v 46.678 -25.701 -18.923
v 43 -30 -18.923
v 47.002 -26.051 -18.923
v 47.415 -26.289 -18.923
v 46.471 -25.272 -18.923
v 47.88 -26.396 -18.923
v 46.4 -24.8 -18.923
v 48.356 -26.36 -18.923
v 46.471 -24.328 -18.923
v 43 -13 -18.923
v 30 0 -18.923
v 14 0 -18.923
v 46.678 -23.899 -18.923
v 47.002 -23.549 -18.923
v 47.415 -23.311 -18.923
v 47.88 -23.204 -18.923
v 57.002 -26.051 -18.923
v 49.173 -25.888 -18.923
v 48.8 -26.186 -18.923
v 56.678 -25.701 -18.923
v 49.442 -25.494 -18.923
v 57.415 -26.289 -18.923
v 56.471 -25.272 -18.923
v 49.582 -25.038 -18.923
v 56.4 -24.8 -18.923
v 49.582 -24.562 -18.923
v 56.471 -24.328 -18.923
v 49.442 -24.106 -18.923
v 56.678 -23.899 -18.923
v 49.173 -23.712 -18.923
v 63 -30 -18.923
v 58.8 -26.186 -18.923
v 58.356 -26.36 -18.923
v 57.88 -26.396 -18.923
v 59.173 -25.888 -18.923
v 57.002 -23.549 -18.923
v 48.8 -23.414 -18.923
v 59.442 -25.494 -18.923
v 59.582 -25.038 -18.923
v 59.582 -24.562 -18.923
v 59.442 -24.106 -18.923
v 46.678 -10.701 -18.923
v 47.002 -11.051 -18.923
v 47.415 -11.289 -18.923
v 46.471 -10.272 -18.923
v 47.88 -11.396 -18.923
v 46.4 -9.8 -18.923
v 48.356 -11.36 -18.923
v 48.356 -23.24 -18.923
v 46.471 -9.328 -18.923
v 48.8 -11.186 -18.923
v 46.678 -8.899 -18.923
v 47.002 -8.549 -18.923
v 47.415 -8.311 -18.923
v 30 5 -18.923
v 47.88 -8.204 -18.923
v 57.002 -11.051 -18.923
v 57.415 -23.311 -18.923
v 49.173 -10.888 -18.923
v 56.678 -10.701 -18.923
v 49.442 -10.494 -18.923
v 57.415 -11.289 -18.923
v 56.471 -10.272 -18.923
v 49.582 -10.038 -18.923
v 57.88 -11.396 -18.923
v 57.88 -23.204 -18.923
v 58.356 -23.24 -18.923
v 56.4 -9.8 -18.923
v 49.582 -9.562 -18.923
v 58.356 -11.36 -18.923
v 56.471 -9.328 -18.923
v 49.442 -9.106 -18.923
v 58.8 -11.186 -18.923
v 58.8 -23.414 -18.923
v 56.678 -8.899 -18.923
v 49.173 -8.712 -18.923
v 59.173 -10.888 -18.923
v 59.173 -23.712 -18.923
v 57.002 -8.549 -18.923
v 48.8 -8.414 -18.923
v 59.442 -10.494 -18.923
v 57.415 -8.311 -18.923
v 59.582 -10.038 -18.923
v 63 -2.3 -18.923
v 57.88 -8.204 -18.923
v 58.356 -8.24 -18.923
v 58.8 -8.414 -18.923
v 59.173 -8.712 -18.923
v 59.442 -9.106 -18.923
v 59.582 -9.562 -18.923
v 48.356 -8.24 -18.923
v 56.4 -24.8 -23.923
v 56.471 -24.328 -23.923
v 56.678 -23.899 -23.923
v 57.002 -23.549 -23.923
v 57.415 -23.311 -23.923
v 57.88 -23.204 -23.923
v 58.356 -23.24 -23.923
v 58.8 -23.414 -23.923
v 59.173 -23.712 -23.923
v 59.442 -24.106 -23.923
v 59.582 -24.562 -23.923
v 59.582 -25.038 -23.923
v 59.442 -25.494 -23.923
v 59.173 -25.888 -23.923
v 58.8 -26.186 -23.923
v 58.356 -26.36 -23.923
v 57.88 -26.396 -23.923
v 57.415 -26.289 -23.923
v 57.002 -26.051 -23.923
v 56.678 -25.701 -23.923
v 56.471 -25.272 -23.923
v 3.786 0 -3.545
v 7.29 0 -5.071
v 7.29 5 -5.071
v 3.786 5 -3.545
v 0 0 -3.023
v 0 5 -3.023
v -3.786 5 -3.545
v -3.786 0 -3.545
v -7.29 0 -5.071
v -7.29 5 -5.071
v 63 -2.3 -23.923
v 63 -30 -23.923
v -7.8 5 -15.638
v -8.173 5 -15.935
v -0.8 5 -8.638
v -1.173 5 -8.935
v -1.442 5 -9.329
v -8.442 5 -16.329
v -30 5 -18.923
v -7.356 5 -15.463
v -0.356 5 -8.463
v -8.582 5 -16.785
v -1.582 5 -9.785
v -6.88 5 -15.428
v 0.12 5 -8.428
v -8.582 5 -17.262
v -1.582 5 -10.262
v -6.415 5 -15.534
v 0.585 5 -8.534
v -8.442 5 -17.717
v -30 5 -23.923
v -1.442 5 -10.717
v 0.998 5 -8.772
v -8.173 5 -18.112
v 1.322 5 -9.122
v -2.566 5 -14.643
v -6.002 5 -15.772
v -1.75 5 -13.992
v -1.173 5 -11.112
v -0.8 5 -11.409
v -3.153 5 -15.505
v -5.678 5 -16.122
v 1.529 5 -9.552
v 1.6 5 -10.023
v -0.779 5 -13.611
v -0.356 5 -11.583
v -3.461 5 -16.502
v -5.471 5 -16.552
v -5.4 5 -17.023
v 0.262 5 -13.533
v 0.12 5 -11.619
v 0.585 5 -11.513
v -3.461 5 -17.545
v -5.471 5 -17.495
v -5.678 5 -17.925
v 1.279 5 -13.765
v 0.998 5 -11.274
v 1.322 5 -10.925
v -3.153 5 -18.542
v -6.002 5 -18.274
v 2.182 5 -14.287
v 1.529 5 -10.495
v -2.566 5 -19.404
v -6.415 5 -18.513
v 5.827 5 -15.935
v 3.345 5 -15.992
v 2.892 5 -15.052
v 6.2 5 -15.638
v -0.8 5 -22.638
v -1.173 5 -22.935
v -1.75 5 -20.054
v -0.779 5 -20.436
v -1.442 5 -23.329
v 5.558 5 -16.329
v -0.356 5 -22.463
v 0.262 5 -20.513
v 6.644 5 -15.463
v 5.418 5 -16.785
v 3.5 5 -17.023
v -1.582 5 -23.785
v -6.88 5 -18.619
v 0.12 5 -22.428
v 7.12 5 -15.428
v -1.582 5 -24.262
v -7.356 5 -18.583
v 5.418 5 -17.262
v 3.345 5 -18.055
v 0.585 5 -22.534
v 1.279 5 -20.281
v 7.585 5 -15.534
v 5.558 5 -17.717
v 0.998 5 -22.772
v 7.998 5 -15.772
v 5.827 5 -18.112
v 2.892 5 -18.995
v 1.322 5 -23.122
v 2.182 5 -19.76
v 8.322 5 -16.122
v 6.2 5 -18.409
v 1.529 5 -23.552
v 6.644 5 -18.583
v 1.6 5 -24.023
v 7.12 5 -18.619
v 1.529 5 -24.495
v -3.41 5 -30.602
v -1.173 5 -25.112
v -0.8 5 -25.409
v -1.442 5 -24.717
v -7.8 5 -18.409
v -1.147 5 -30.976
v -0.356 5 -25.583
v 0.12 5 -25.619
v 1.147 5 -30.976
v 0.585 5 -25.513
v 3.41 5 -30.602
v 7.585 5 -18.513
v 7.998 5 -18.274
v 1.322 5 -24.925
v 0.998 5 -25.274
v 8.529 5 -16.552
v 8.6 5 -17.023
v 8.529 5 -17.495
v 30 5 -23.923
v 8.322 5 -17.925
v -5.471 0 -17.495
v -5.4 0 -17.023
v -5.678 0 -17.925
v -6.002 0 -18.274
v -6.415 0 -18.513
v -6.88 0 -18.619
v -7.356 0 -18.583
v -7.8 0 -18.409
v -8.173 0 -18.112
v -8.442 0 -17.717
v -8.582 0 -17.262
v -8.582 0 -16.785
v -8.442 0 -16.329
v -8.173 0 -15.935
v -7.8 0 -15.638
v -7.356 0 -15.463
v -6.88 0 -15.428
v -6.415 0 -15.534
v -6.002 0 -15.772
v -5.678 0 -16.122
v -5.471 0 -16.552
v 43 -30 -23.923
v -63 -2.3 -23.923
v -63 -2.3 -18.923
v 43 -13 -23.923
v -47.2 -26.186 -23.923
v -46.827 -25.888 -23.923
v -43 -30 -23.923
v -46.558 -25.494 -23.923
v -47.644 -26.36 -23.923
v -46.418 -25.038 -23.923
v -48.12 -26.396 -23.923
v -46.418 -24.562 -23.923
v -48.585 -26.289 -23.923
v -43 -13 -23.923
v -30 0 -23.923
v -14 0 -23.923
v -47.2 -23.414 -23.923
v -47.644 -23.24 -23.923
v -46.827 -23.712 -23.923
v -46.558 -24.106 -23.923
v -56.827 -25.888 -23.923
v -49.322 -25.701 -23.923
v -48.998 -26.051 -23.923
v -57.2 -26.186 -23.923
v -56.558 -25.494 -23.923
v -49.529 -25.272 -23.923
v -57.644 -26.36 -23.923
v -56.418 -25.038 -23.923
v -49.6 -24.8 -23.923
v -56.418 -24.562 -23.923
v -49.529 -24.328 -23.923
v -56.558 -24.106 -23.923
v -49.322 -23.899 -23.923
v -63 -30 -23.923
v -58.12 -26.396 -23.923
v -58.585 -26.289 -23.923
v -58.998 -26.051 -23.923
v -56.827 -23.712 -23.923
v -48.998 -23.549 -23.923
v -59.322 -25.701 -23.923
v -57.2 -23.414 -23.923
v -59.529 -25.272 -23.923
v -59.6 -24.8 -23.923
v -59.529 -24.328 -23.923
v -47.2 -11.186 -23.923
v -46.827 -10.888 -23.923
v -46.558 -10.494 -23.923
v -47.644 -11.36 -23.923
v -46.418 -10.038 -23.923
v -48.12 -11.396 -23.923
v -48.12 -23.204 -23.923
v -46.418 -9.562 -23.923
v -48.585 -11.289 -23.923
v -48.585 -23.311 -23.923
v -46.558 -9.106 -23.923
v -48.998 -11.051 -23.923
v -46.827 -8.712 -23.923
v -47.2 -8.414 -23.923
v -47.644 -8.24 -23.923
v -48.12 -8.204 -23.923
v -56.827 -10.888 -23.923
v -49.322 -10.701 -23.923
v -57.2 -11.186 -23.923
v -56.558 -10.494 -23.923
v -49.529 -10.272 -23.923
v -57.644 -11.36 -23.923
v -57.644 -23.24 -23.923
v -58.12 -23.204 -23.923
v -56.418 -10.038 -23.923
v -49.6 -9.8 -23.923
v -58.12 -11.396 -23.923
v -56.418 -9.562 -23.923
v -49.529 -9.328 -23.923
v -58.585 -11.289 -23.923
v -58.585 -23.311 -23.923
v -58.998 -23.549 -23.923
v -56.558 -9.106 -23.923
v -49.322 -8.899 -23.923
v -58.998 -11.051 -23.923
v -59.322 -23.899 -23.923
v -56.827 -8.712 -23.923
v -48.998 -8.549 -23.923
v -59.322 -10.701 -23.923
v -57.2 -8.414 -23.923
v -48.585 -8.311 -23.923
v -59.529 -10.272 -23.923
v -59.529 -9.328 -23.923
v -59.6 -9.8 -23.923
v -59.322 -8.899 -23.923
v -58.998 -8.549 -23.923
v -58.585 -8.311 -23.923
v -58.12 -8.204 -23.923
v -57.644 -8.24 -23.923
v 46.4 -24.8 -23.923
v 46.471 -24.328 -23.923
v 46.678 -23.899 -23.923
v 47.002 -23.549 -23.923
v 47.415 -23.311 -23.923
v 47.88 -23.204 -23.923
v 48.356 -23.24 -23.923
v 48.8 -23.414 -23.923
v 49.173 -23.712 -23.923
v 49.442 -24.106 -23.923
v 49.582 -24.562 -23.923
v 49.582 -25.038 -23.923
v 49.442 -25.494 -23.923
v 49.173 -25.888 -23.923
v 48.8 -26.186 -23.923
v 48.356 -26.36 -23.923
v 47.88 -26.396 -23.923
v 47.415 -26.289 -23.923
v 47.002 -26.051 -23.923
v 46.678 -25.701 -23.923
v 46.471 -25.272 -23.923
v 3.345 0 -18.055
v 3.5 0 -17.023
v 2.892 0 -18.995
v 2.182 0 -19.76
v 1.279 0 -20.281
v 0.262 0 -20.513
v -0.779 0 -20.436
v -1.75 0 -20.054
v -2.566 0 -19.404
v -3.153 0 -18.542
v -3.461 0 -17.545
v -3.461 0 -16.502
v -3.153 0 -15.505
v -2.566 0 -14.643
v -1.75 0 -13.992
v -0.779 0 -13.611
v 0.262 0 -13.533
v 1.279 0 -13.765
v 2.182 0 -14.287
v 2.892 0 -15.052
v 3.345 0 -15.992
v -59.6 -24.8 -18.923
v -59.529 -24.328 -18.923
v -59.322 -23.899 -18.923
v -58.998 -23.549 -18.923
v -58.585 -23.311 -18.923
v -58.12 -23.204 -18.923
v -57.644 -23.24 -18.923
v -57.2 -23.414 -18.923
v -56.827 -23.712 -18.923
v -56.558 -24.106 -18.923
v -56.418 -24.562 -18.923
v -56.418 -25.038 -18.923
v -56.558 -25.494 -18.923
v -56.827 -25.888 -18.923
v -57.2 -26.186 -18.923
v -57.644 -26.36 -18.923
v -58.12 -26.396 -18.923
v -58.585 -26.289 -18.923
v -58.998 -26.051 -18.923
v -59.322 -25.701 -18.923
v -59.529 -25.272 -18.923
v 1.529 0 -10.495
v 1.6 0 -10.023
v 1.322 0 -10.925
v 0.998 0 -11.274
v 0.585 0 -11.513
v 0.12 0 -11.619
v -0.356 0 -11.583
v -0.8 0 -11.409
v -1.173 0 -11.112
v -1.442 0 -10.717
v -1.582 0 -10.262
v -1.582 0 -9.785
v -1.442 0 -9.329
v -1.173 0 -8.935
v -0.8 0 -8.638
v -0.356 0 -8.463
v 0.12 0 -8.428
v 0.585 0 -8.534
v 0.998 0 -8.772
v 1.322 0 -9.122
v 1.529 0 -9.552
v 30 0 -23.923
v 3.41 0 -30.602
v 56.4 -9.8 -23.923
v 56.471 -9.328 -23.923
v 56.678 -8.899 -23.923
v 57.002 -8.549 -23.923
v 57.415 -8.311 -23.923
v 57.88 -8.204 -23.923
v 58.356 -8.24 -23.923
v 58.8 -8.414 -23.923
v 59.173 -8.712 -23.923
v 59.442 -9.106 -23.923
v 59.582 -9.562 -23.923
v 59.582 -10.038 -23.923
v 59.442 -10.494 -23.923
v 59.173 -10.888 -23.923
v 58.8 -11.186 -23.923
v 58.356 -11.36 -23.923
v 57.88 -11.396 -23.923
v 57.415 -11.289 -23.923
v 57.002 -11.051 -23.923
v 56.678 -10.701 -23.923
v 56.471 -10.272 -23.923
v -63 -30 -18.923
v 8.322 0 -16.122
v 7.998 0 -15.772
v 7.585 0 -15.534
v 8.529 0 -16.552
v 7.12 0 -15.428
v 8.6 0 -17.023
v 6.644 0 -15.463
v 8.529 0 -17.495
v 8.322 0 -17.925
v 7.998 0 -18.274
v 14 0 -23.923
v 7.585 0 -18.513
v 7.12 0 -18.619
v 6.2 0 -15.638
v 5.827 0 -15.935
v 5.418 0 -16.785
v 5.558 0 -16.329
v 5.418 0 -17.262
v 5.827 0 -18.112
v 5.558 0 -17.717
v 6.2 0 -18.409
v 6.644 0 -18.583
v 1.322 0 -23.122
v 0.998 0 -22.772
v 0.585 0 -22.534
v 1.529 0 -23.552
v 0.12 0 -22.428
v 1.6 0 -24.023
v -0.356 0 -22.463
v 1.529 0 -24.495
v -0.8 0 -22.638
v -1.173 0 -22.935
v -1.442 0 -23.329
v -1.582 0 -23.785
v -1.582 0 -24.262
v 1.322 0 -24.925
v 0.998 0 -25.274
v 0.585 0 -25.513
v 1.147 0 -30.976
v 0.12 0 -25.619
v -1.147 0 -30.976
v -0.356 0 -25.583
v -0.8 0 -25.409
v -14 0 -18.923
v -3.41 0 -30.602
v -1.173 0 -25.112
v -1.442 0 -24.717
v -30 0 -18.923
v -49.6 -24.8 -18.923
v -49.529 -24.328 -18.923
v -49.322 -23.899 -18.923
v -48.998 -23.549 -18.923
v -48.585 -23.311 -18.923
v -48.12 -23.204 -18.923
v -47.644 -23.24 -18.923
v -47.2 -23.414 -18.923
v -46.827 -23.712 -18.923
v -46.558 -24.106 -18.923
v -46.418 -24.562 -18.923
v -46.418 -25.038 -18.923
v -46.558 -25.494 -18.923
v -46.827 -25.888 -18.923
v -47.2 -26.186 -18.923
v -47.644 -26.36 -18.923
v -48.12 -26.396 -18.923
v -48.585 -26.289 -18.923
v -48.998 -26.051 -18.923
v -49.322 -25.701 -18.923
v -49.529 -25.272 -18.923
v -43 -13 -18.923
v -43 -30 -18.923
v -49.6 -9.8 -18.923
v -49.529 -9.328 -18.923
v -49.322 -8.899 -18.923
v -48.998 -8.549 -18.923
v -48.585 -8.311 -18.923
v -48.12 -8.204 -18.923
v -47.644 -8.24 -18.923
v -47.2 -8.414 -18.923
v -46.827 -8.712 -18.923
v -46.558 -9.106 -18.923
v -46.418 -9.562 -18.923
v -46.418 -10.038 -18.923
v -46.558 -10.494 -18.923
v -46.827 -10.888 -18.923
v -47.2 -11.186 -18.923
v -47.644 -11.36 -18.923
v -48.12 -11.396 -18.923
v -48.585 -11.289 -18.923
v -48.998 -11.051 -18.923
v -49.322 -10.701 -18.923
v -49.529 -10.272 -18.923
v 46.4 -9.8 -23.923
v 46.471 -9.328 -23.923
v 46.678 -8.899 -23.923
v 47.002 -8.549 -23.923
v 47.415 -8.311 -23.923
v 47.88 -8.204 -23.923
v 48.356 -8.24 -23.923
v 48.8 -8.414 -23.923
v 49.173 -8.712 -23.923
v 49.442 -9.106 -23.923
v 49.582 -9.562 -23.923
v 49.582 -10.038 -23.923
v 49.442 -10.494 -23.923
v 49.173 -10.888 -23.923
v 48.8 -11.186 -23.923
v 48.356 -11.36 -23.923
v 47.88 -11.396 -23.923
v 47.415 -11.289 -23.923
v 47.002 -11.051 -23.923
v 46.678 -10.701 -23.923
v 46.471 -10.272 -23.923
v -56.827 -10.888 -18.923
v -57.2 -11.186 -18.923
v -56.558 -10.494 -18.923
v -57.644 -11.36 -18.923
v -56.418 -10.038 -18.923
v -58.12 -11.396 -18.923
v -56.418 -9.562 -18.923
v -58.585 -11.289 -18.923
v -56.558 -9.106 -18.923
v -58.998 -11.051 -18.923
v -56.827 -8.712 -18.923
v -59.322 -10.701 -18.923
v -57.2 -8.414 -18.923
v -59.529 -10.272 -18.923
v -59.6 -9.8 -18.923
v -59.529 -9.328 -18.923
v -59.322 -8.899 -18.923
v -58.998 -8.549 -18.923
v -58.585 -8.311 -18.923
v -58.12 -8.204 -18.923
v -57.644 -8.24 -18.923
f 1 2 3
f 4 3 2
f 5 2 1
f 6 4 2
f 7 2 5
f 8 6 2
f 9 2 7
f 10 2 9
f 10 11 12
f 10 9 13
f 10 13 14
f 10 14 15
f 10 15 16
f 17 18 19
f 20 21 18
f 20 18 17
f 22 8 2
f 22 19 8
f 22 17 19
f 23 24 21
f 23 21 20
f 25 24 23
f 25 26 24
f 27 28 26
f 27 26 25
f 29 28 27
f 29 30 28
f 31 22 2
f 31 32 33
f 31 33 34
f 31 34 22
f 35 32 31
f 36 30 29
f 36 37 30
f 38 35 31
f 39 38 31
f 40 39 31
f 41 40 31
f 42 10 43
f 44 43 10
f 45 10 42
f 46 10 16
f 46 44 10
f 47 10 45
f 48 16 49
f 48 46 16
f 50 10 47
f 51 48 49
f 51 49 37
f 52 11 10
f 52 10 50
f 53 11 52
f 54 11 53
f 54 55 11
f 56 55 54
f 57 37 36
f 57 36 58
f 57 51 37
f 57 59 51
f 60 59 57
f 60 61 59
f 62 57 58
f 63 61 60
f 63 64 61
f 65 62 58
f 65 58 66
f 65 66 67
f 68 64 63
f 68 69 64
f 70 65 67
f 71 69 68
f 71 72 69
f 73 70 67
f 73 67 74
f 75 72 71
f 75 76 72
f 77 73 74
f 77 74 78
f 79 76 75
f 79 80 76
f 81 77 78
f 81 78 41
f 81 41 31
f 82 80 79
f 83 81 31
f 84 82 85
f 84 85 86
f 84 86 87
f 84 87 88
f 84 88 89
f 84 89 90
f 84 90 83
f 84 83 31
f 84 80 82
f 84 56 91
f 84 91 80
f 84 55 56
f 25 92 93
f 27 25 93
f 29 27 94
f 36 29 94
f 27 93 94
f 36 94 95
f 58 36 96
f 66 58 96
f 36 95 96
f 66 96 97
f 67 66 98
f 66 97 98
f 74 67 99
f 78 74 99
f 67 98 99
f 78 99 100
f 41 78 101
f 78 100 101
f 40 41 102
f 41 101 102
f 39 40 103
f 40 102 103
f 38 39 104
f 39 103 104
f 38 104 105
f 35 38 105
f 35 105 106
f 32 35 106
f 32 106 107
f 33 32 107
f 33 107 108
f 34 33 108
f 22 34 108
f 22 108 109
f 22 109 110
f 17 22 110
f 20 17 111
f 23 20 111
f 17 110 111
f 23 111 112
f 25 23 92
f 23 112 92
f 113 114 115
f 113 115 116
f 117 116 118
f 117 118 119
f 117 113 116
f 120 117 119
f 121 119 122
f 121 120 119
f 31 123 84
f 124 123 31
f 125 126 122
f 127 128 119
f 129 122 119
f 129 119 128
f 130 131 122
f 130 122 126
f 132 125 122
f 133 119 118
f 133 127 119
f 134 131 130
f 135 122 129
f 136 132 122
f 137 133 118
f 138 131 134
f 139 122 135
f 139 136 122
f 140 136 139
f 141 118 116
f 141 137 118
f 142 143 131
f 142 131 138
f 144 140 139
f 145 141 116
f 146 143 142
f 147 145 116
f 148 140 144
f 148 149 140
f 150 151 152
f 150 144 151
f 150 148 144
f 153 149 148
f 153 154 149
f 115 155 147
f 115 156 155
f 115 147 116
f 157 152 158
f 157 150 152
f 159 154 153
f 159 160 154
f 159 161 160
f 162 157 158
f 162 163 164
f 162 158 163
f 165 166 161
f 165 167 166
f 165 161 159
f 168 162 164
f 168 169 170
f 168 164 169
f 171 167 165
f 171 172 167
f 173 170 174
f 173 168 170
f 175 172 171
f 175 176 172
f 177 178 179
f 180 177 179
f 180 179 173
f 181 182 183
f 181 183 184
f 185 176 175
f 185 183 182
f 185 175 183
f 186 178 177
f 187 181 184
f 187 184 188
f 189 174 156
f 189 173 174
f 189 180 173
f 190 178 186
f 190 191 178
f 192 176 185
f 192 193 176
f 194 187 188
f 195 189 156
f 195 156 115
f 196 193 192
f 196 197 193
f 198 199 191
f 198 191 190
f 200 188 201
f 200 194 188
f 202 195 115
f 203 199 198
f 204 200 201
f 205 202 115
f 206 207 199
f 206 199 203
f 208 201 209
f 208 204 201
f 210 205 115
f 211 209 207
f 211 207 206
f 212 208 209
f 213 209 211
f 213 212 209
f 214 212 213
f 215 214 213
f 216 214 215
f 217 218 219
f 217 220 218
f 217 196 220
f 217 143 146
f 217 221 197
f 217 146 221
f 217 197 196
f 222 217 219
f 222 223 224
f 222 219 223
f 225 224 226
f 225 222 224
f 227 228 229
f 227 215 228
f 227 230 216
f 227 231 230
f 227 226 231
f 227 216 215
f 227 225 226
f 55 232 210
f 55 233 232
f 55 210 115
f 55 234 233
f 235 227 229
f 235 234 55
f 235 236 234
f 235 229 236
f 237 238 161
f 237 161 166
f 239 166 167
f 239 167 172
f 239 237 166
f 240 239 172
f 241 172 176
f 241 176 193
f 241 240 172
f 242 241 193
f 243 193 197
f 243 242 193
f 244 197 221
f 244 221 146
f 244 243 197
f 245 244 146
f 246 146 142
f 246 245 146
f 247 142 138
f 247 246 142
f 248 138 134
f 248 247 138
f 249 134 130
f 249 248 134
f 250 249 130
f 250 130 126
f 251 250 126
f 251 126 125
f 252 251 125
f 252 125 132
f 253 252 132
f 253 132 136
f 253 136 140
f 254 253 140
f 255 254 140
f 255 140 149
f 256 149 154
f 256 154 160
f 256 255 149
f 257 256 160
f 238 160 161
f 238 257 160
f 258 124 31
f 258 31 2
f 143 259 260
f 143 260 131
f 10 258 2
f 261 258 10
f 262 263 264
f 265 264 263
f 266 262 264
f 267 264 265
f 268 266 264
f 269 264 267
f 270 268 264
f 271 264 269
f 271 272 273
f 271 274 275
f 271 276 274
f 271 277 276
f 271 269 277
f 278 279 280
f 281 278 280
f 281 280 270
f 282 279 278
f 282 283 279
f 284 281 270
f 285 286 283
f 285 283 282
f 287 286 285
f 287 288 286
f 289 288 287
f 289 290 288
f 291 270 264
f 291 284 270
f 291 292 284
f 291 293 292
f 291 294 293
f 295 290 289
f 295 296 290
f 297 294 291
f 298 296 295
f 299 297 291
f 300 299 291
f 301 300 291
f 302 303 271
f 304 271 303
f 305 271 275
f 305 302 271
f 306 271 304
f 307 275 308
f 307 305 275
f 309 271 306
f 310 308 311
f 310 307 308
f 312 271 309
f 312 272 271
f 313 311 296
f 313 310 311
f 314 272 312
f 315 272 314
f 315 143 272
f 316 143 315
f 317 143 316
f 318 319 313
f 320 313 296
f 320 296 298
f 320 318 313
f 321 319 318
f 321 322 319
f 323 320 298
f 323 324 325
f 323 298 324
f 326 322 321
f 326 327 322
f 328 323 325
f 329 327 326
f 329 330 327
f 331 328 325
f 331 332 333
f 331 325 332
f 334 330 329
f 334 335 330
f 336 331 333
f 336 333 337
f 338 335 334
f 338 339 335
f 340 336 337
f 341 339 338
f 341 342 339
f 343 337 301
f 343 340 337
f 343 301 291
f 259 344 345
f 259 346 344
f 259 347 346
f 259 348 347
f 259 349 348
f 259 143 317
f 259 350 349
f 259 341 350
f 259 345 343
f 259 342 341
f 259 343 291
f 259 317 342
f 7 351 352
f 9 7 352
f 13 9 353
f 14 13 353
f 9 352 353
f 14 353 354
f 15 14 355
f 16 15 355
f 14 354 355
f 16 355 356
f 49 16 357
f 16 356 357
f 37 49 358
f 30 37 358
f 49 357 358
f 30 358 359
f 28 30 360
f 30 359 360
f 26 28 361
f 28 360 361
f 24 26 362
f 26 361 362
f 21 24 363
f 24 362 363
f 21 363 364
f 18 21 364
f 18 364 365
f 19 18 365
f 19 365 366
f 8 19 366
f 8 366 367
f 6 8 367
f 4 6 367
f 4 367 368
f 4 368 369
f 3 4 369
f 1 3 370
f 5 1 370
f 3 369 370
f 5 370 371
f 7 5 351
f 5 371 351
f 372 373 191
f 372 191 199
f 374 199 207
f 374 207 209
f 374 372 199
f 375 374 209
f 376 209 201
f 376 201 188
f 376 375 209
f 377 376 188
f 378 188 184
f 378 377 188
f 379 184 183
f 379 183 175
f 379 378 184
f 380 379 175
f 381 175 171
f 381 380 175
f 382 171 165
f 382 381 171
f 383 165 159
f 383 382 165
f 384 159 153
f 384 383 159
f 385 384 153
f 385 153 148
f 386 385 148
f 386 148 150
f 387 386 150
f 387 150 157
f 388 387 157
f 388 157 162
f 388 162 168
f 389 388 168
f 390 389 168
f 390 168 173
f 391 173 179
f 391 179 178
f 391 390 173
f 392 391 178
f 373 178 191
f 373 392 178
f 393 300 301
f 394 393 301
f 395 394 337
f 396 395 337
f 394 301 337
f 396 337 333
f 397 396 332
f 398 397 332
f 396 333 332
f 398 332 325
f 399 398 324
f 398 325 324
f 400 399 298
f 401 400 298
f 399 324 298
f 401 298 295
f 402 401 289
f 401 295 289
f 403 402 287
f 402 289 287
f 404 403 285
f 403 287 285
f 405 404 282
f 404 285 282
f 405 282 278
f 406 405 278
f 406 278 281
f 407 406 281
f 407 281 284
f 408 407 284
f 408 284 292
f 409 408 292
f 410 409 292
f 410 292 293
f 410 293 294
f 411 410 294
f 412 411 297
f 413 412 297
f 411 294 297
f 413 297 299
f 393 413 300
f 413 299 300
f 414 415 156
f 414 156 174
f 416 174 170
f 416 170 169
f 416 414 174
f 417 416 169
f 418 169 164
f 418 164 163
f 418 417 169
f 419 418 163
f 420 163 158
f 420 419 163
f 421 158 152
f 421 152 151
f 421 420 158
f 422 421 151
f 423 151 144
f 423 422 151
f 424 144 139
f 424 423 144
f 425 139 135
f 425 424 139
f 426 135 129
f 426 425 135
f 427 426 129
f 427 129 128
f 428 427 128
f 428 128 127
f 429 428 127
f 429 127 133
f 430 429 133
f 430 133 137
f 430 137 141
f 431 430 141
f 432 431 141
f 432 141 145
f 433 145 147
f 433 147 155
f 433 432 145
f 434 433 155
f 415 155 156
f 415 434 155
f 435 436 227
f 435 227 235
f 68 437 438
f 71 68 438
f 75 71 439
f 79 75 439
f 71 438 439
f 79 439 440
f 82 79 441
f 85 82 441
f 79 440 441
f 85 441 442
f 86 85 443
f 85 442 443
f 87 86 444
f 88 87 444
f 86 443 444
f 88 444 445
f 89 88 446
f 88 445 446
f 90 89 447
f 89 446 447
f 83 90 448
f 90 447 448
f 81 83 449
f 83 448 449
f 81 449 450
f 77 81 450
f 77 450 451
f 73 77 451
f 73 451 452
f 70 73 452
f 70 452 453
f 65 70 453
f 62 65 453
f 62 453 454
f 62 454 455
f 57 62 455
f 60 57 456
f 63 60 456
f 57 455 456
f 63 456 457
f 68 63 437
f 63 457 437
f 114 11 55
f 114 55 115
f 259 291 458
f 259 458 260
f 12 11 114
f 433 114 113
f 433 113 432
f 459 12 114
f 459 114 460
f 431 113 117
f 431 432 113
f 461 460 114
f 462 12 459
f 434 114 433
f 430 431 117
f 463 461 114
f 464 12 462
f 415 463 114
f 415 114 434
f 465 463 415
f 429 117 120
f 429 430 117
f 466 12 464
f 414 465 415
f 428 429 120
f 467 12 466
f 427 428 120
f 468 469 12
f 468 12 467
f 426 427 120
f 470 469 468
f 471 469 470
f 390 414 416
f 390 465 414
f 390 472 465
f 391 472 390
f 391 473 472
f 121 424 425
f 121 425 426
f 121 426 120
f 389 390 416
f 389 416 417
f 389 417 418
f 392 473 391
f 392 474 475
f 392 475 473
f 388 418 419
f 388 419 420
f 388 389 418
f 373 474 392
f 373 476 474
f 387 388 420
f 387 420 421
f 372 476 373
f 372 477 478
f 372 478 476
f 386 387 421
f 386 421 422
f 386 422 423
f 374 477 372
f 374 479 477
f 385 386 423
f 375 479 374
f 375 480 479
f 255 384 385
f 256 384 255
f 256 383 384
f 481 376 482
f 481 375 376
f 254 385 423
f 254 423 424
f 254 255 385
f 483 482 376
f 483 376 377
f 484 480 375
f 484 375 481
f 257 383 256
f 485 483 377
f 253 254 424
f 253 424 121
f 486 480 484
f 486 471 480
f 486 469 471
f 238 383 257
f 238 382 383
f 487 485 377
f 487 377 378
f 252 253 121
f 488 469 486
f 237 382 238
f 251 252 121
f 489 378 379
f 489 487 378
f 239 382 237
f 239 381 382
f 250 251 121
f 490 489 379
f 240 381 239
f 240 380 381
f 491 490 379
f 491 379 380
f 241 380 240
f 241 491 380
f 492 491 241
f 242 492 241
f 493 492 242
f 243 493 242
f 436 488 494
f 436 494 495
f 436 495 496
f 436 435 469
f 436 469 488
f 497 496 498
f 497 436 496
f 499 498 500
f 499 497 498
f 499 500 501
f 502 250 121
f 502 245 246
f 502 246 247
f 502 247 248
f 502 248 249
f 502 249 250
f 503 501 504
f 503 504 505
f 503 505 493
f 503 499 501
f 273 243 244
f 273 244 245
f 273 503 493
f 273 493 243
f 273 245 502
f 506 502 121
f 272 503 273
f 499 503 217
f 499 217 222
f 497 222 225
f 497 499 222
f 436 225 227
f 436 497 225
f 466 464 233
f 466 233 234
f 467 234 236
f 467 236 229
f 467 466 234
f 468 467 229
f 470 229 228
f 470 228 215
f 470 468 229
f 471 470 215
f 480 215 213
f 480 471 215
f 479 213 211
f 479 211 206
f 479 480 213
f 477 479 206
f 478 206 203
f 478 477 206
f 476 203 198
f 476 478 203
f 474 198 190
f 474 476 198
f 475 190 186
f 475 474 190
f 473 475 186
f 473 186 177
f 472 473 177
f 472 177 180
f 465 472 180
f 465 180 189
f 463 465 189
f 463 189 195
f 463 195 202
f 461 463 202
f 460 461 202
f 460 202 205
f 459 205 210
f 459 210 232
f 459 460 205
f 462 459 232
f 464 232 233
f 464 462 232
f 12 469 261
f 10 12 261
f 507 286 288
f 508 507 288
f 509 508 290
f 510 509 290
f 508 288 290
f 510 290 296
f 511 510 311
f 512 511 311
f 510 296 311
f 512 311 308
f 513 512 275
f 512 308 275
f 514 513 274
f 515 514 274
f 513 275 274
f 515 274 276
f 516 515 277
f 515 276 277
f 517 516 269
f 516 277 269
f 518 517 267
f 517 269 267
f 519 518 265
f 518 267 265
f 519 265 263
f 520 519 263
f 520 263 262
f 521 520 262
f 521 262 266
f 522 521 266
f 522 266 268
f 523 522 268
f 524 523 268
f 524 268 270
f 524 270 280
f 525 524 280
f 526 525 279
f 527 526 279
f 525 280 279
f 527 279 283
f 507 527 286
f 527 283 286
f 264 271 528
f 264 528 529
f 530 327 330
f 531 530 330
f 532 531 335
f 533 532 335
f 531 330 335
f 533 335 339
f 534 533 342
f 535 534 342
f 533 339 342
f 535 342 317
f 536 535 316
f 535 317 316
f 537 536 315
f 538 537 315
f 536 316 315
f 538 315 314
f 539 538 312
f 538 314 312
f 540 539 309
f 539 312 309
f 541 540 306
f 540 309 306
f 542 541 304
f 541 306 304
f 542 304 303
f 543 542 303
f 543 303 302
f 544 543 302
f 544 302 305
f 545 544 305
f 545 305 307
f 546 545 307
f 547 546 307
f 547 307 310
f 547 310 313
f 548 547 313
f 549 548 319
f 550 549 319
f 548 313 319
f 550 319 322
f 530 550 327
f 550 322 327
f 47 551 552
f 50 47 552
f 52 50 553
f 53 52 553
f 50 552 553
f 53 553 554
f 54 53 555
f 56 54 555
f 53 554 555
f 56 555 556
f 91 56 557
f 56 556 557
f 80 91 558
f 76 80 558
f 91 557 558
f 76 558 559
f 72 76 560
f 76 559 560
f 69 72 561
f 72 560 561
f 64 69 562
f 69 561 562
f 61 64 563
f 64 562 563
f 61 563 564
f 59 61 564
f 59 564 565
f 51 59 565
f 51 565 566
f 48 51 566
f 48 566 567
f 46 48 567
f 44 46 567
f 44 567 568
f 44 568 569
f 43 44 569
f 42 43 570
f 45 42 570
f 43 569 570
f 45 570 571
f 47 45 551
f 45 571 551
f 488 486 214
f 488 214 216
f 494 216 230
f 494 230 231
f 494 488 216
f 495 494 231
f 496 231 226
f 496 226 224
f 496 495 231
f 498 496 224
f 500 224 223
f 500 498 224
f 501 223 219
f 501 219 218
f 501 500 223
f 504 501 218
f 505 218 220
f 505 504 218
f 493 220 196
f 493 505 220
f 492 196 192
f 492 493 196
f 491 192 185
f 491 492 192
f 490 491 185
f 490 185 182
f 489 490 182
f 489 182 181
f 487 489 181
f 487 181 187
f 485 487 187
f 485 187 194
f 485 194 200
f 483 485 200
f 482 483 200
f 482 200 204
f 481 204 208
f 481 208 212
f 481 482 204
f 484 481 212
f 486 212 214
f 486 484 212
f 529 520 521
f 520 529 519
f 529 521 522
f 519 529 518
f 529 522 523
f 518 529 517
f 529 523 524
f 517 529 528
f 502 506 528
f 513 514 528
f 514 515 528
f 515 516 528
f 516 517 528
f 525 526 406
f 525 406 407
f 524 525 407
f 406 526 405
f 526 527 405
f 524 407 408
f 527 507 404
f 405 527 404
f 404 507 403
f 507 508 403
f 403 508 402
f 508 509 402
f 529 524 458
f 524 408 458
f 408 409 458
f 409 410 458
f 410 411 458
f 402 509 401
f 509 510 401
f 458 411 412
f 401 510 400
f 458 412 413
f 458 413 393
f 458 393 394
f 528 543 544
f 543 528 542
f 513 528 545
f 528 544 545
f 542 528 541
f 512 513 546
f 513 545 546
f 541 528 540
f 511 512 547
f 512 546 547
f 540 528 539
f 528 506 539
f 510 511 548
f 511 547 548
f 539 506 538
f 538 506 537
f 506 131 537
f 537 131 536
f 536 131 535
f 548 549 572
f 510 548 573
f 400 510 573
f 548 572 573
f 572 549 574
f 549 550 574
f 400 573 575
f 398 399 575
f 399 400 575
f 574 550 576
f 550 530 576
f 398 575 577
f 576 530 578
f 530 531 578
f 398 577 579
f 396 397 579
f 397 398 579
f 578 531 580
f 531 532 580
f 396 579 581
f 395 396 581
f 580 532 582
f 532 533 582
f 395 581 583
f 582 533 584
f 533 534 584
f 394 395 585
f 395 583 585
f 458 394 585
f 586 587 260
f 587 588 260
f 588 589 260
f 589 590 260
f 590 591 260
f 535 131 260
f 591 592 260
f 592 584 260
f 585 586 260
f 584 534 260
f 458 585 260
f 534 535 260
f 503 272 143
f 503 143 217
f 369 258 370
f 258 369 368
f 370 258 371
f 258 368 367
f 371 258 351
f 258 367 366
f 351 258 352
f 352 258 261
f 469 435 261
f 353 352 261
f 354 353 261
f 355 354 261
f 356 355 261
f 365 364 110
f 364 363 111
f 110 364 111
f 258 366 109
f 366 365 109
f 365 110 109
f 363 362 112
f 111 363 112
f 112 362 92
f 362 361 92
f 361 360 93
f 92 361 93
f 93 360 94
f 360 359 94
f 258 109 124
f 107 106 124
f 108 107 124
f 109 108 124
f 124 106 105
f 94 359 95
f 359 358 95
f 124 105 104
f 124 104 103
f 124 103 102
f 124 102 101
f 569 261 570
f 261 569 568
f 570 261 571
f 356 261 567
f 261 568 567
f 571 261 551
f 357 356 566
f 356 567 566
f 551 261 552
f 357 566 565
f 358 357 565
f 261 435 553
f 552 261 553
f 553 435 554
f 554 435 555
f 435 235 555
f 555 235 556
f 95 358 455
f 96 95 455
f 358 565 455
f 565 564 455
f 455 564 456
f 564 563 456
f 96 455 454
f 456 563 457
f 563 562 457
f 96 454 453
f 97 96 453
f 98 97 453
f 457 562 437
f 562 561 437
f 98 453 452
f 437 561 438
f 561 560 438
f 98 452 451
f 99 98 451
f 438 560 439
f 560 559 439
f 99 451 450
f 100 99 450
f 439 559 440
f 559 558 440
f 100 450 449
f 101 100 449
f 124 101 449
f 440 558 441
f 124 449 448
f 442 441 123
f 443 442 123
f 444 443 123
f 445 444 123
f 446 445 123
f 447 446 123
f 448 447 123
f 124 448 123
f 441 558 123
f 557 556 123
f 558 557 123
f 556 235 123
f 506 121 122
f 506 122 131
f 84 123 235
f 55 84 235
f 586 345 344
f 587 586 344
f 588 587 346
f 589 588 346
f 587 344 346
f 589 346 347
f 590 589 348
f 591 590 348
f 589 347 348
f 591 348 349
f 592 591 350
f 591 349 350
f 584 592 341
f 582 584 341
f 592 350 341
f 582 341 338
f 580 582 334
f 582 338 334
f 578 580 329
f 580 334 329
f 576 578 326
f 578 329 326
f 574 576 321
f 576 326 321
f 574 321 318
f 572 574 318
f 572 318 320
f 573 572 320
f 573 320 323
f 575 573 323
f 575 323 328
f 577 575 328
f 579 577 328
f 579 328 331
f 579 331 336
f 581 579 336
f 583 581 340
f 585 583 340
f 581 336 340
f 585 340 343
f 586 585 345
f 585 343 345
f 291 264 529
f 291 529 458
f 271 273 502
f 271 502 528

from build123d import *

# Parameters (mm, degrees)
SKETCH_1_R          = 1.6
SKETCH_1_R_2        = 3.5
EXTRUDE_1_DEPTH     = 5
SKETCH_3_R          = 1.6
EXTRUDE_3_DEPTH     = 5
EXTRUDE_4_DEPTH     = 5
CUT_EXTRUDE_1_DEPTH = 21.9


with BuildPart() as part:
    # 草图1 → 凸台-拉伸1 (new body)
    with BuildSketch(Plane(origin=(0, 0, 0), x_dir=(1, 0, 0), z_dir=(0, 1, 0))):
        with BuildLine():
            Line((30, 23.923257503), (36.791550388, 23.923257503))
            Line((36.791550388, 23.923257503), (45, 23.923257503))
            Line((45, 23.923257503), (45, 18.923257503))
            Line((45, 18.923257503), (30, 18.923257503))
            Line((30, 18.923257503), (7.290296698, 5.071204372))
            ThreePointArc((7.290296698, 5.071204372), (0, 3.023257503), (-7.290296698, 5.071204372))
            Line((-7.290296698, 5.071204372), (-30, 18.923257503))
            Line((-30, 18.923257503), (-45, 18.923257503))
            Line((-45, 18.923257503), (-45, 23.923257503))
            Line((-45, 23.923257503), (-36.791550388, 23.923257503))
            Line((-36.791550388, 23.923257503), (-30, 23.923257503))
            Line((-30, 23.923257503), (-3.410329214, 30.601536284))
            ThreePointArc((-3.410329214, 30.601536284), (0, 31.023257503), (3.410329214, 30.601536284))
            Line((3.410329214, 30.601536284), (30, 23.923257503))
        make_face()
        with Locations((0, 24.023257503)):
            Circle(SKETCH_1_R, mode=Mode.SUBTRACT)
        with Locations((0, 10.023257503)):
            Circle(SKETCH_1_R, mode=Mode.SUBTRACT)
        with Locations((-7, 17.023257503)):
            Circle(SKETCH_1_R, mode=Mode.SUBTRACT)
        with Locations((7, 17.023257503)):
            Circle(SKETCH_1_R, mode=Mode.SUBTRACT)
        with Locations((0, 17.023257503)):
            Circle(SKETCH_1_R_2, mode=Mode.SUBTRACT)
    extrude(amount=EXTRUDE_1_DEPTH)

    # 草图3 → 凸台-拉伸3 (add)
    with BuildSketch(Plane(origin=(0, 0, -23.923257503), x_dir=(-1, 0, 0), z_dir=(0, 0, -1))):
        Polygon((-45, 5), (-63, 5), (-63, -30), (-43, -30), (-43, -20.44669455), (-43, -7.63227787), (-43, 5), align=None)
        with Locations((-58, -9.8)):
            Circle(SKETCH_3_R, mode=Mode.SUBTRACT)
        with Locations((-58, -24.8)):
            Circle(SKETCH_3_R, mode=Mode.SUBTRACT)
        with Locations((-48, -24.8)):
            Circle(SKETCH_3_R, mode=Mode.SUBTRACT)
        with Locations((-48, -9.8)):
            Circle(SKETCH_3_R, mode=Mode.SUBTRACT)
        Polygon((43, -20.44669455), (43, -30), (63, -30), (63, 5), (45, 5), (43, 5), (43, -7.63227787), align=None)
        with Locations((48, -9.8)):
            Circle(SKETCH_3_R, mode=Mode.SUBTRACT)
        with Locations((48, -24.8)):
            Circle(SKETCH_3_R, mode=Mode.SUBTRACT)
        with Locations((58, -24.8)):
            Circle(SKETCH_3_R, mode=Mode.SUBTRACT)
        with Locations((58, -9.8)):
            Circle(SKETCH_3_R, mode=Mode.SUBTRACT)
    extrude(amount=-EXTRUDE_3_DEPTH)

    # 草图5 → 凸台-拉伸4 (add)
    with BuildSketch(Plane(origin=(0, 0, -23.923257503), x_dir=(-1, 0, 0), z_dir=(0, 0, -1))):
        Polygon((14, 0), (43, -13), (43, 0), align=None)
        Polygon((-43, 0), (-14, 0), (-43, -13), align=None)
    extrude(amount=-EXTRUDE_4_DEPTH)

    # 草图6 → 切除-拉伸1 (cut, through all)
    with BuildSketch(Plane(origin=(0, 0, -23.923257503), x_dir=(-1, 0, 0), z_dir=(0, 0, -1))):
        Polygon((-63, -2.3), (-30, 5), (-63, 5), align=None)
        Polygon((63, -2.3), (30, 5), (63, 5), align=None)
    extrude(amount=-CUT_EXTRUDE_1_DEPTH, mode=Mode.SUBTRACT)


solid = part.part
